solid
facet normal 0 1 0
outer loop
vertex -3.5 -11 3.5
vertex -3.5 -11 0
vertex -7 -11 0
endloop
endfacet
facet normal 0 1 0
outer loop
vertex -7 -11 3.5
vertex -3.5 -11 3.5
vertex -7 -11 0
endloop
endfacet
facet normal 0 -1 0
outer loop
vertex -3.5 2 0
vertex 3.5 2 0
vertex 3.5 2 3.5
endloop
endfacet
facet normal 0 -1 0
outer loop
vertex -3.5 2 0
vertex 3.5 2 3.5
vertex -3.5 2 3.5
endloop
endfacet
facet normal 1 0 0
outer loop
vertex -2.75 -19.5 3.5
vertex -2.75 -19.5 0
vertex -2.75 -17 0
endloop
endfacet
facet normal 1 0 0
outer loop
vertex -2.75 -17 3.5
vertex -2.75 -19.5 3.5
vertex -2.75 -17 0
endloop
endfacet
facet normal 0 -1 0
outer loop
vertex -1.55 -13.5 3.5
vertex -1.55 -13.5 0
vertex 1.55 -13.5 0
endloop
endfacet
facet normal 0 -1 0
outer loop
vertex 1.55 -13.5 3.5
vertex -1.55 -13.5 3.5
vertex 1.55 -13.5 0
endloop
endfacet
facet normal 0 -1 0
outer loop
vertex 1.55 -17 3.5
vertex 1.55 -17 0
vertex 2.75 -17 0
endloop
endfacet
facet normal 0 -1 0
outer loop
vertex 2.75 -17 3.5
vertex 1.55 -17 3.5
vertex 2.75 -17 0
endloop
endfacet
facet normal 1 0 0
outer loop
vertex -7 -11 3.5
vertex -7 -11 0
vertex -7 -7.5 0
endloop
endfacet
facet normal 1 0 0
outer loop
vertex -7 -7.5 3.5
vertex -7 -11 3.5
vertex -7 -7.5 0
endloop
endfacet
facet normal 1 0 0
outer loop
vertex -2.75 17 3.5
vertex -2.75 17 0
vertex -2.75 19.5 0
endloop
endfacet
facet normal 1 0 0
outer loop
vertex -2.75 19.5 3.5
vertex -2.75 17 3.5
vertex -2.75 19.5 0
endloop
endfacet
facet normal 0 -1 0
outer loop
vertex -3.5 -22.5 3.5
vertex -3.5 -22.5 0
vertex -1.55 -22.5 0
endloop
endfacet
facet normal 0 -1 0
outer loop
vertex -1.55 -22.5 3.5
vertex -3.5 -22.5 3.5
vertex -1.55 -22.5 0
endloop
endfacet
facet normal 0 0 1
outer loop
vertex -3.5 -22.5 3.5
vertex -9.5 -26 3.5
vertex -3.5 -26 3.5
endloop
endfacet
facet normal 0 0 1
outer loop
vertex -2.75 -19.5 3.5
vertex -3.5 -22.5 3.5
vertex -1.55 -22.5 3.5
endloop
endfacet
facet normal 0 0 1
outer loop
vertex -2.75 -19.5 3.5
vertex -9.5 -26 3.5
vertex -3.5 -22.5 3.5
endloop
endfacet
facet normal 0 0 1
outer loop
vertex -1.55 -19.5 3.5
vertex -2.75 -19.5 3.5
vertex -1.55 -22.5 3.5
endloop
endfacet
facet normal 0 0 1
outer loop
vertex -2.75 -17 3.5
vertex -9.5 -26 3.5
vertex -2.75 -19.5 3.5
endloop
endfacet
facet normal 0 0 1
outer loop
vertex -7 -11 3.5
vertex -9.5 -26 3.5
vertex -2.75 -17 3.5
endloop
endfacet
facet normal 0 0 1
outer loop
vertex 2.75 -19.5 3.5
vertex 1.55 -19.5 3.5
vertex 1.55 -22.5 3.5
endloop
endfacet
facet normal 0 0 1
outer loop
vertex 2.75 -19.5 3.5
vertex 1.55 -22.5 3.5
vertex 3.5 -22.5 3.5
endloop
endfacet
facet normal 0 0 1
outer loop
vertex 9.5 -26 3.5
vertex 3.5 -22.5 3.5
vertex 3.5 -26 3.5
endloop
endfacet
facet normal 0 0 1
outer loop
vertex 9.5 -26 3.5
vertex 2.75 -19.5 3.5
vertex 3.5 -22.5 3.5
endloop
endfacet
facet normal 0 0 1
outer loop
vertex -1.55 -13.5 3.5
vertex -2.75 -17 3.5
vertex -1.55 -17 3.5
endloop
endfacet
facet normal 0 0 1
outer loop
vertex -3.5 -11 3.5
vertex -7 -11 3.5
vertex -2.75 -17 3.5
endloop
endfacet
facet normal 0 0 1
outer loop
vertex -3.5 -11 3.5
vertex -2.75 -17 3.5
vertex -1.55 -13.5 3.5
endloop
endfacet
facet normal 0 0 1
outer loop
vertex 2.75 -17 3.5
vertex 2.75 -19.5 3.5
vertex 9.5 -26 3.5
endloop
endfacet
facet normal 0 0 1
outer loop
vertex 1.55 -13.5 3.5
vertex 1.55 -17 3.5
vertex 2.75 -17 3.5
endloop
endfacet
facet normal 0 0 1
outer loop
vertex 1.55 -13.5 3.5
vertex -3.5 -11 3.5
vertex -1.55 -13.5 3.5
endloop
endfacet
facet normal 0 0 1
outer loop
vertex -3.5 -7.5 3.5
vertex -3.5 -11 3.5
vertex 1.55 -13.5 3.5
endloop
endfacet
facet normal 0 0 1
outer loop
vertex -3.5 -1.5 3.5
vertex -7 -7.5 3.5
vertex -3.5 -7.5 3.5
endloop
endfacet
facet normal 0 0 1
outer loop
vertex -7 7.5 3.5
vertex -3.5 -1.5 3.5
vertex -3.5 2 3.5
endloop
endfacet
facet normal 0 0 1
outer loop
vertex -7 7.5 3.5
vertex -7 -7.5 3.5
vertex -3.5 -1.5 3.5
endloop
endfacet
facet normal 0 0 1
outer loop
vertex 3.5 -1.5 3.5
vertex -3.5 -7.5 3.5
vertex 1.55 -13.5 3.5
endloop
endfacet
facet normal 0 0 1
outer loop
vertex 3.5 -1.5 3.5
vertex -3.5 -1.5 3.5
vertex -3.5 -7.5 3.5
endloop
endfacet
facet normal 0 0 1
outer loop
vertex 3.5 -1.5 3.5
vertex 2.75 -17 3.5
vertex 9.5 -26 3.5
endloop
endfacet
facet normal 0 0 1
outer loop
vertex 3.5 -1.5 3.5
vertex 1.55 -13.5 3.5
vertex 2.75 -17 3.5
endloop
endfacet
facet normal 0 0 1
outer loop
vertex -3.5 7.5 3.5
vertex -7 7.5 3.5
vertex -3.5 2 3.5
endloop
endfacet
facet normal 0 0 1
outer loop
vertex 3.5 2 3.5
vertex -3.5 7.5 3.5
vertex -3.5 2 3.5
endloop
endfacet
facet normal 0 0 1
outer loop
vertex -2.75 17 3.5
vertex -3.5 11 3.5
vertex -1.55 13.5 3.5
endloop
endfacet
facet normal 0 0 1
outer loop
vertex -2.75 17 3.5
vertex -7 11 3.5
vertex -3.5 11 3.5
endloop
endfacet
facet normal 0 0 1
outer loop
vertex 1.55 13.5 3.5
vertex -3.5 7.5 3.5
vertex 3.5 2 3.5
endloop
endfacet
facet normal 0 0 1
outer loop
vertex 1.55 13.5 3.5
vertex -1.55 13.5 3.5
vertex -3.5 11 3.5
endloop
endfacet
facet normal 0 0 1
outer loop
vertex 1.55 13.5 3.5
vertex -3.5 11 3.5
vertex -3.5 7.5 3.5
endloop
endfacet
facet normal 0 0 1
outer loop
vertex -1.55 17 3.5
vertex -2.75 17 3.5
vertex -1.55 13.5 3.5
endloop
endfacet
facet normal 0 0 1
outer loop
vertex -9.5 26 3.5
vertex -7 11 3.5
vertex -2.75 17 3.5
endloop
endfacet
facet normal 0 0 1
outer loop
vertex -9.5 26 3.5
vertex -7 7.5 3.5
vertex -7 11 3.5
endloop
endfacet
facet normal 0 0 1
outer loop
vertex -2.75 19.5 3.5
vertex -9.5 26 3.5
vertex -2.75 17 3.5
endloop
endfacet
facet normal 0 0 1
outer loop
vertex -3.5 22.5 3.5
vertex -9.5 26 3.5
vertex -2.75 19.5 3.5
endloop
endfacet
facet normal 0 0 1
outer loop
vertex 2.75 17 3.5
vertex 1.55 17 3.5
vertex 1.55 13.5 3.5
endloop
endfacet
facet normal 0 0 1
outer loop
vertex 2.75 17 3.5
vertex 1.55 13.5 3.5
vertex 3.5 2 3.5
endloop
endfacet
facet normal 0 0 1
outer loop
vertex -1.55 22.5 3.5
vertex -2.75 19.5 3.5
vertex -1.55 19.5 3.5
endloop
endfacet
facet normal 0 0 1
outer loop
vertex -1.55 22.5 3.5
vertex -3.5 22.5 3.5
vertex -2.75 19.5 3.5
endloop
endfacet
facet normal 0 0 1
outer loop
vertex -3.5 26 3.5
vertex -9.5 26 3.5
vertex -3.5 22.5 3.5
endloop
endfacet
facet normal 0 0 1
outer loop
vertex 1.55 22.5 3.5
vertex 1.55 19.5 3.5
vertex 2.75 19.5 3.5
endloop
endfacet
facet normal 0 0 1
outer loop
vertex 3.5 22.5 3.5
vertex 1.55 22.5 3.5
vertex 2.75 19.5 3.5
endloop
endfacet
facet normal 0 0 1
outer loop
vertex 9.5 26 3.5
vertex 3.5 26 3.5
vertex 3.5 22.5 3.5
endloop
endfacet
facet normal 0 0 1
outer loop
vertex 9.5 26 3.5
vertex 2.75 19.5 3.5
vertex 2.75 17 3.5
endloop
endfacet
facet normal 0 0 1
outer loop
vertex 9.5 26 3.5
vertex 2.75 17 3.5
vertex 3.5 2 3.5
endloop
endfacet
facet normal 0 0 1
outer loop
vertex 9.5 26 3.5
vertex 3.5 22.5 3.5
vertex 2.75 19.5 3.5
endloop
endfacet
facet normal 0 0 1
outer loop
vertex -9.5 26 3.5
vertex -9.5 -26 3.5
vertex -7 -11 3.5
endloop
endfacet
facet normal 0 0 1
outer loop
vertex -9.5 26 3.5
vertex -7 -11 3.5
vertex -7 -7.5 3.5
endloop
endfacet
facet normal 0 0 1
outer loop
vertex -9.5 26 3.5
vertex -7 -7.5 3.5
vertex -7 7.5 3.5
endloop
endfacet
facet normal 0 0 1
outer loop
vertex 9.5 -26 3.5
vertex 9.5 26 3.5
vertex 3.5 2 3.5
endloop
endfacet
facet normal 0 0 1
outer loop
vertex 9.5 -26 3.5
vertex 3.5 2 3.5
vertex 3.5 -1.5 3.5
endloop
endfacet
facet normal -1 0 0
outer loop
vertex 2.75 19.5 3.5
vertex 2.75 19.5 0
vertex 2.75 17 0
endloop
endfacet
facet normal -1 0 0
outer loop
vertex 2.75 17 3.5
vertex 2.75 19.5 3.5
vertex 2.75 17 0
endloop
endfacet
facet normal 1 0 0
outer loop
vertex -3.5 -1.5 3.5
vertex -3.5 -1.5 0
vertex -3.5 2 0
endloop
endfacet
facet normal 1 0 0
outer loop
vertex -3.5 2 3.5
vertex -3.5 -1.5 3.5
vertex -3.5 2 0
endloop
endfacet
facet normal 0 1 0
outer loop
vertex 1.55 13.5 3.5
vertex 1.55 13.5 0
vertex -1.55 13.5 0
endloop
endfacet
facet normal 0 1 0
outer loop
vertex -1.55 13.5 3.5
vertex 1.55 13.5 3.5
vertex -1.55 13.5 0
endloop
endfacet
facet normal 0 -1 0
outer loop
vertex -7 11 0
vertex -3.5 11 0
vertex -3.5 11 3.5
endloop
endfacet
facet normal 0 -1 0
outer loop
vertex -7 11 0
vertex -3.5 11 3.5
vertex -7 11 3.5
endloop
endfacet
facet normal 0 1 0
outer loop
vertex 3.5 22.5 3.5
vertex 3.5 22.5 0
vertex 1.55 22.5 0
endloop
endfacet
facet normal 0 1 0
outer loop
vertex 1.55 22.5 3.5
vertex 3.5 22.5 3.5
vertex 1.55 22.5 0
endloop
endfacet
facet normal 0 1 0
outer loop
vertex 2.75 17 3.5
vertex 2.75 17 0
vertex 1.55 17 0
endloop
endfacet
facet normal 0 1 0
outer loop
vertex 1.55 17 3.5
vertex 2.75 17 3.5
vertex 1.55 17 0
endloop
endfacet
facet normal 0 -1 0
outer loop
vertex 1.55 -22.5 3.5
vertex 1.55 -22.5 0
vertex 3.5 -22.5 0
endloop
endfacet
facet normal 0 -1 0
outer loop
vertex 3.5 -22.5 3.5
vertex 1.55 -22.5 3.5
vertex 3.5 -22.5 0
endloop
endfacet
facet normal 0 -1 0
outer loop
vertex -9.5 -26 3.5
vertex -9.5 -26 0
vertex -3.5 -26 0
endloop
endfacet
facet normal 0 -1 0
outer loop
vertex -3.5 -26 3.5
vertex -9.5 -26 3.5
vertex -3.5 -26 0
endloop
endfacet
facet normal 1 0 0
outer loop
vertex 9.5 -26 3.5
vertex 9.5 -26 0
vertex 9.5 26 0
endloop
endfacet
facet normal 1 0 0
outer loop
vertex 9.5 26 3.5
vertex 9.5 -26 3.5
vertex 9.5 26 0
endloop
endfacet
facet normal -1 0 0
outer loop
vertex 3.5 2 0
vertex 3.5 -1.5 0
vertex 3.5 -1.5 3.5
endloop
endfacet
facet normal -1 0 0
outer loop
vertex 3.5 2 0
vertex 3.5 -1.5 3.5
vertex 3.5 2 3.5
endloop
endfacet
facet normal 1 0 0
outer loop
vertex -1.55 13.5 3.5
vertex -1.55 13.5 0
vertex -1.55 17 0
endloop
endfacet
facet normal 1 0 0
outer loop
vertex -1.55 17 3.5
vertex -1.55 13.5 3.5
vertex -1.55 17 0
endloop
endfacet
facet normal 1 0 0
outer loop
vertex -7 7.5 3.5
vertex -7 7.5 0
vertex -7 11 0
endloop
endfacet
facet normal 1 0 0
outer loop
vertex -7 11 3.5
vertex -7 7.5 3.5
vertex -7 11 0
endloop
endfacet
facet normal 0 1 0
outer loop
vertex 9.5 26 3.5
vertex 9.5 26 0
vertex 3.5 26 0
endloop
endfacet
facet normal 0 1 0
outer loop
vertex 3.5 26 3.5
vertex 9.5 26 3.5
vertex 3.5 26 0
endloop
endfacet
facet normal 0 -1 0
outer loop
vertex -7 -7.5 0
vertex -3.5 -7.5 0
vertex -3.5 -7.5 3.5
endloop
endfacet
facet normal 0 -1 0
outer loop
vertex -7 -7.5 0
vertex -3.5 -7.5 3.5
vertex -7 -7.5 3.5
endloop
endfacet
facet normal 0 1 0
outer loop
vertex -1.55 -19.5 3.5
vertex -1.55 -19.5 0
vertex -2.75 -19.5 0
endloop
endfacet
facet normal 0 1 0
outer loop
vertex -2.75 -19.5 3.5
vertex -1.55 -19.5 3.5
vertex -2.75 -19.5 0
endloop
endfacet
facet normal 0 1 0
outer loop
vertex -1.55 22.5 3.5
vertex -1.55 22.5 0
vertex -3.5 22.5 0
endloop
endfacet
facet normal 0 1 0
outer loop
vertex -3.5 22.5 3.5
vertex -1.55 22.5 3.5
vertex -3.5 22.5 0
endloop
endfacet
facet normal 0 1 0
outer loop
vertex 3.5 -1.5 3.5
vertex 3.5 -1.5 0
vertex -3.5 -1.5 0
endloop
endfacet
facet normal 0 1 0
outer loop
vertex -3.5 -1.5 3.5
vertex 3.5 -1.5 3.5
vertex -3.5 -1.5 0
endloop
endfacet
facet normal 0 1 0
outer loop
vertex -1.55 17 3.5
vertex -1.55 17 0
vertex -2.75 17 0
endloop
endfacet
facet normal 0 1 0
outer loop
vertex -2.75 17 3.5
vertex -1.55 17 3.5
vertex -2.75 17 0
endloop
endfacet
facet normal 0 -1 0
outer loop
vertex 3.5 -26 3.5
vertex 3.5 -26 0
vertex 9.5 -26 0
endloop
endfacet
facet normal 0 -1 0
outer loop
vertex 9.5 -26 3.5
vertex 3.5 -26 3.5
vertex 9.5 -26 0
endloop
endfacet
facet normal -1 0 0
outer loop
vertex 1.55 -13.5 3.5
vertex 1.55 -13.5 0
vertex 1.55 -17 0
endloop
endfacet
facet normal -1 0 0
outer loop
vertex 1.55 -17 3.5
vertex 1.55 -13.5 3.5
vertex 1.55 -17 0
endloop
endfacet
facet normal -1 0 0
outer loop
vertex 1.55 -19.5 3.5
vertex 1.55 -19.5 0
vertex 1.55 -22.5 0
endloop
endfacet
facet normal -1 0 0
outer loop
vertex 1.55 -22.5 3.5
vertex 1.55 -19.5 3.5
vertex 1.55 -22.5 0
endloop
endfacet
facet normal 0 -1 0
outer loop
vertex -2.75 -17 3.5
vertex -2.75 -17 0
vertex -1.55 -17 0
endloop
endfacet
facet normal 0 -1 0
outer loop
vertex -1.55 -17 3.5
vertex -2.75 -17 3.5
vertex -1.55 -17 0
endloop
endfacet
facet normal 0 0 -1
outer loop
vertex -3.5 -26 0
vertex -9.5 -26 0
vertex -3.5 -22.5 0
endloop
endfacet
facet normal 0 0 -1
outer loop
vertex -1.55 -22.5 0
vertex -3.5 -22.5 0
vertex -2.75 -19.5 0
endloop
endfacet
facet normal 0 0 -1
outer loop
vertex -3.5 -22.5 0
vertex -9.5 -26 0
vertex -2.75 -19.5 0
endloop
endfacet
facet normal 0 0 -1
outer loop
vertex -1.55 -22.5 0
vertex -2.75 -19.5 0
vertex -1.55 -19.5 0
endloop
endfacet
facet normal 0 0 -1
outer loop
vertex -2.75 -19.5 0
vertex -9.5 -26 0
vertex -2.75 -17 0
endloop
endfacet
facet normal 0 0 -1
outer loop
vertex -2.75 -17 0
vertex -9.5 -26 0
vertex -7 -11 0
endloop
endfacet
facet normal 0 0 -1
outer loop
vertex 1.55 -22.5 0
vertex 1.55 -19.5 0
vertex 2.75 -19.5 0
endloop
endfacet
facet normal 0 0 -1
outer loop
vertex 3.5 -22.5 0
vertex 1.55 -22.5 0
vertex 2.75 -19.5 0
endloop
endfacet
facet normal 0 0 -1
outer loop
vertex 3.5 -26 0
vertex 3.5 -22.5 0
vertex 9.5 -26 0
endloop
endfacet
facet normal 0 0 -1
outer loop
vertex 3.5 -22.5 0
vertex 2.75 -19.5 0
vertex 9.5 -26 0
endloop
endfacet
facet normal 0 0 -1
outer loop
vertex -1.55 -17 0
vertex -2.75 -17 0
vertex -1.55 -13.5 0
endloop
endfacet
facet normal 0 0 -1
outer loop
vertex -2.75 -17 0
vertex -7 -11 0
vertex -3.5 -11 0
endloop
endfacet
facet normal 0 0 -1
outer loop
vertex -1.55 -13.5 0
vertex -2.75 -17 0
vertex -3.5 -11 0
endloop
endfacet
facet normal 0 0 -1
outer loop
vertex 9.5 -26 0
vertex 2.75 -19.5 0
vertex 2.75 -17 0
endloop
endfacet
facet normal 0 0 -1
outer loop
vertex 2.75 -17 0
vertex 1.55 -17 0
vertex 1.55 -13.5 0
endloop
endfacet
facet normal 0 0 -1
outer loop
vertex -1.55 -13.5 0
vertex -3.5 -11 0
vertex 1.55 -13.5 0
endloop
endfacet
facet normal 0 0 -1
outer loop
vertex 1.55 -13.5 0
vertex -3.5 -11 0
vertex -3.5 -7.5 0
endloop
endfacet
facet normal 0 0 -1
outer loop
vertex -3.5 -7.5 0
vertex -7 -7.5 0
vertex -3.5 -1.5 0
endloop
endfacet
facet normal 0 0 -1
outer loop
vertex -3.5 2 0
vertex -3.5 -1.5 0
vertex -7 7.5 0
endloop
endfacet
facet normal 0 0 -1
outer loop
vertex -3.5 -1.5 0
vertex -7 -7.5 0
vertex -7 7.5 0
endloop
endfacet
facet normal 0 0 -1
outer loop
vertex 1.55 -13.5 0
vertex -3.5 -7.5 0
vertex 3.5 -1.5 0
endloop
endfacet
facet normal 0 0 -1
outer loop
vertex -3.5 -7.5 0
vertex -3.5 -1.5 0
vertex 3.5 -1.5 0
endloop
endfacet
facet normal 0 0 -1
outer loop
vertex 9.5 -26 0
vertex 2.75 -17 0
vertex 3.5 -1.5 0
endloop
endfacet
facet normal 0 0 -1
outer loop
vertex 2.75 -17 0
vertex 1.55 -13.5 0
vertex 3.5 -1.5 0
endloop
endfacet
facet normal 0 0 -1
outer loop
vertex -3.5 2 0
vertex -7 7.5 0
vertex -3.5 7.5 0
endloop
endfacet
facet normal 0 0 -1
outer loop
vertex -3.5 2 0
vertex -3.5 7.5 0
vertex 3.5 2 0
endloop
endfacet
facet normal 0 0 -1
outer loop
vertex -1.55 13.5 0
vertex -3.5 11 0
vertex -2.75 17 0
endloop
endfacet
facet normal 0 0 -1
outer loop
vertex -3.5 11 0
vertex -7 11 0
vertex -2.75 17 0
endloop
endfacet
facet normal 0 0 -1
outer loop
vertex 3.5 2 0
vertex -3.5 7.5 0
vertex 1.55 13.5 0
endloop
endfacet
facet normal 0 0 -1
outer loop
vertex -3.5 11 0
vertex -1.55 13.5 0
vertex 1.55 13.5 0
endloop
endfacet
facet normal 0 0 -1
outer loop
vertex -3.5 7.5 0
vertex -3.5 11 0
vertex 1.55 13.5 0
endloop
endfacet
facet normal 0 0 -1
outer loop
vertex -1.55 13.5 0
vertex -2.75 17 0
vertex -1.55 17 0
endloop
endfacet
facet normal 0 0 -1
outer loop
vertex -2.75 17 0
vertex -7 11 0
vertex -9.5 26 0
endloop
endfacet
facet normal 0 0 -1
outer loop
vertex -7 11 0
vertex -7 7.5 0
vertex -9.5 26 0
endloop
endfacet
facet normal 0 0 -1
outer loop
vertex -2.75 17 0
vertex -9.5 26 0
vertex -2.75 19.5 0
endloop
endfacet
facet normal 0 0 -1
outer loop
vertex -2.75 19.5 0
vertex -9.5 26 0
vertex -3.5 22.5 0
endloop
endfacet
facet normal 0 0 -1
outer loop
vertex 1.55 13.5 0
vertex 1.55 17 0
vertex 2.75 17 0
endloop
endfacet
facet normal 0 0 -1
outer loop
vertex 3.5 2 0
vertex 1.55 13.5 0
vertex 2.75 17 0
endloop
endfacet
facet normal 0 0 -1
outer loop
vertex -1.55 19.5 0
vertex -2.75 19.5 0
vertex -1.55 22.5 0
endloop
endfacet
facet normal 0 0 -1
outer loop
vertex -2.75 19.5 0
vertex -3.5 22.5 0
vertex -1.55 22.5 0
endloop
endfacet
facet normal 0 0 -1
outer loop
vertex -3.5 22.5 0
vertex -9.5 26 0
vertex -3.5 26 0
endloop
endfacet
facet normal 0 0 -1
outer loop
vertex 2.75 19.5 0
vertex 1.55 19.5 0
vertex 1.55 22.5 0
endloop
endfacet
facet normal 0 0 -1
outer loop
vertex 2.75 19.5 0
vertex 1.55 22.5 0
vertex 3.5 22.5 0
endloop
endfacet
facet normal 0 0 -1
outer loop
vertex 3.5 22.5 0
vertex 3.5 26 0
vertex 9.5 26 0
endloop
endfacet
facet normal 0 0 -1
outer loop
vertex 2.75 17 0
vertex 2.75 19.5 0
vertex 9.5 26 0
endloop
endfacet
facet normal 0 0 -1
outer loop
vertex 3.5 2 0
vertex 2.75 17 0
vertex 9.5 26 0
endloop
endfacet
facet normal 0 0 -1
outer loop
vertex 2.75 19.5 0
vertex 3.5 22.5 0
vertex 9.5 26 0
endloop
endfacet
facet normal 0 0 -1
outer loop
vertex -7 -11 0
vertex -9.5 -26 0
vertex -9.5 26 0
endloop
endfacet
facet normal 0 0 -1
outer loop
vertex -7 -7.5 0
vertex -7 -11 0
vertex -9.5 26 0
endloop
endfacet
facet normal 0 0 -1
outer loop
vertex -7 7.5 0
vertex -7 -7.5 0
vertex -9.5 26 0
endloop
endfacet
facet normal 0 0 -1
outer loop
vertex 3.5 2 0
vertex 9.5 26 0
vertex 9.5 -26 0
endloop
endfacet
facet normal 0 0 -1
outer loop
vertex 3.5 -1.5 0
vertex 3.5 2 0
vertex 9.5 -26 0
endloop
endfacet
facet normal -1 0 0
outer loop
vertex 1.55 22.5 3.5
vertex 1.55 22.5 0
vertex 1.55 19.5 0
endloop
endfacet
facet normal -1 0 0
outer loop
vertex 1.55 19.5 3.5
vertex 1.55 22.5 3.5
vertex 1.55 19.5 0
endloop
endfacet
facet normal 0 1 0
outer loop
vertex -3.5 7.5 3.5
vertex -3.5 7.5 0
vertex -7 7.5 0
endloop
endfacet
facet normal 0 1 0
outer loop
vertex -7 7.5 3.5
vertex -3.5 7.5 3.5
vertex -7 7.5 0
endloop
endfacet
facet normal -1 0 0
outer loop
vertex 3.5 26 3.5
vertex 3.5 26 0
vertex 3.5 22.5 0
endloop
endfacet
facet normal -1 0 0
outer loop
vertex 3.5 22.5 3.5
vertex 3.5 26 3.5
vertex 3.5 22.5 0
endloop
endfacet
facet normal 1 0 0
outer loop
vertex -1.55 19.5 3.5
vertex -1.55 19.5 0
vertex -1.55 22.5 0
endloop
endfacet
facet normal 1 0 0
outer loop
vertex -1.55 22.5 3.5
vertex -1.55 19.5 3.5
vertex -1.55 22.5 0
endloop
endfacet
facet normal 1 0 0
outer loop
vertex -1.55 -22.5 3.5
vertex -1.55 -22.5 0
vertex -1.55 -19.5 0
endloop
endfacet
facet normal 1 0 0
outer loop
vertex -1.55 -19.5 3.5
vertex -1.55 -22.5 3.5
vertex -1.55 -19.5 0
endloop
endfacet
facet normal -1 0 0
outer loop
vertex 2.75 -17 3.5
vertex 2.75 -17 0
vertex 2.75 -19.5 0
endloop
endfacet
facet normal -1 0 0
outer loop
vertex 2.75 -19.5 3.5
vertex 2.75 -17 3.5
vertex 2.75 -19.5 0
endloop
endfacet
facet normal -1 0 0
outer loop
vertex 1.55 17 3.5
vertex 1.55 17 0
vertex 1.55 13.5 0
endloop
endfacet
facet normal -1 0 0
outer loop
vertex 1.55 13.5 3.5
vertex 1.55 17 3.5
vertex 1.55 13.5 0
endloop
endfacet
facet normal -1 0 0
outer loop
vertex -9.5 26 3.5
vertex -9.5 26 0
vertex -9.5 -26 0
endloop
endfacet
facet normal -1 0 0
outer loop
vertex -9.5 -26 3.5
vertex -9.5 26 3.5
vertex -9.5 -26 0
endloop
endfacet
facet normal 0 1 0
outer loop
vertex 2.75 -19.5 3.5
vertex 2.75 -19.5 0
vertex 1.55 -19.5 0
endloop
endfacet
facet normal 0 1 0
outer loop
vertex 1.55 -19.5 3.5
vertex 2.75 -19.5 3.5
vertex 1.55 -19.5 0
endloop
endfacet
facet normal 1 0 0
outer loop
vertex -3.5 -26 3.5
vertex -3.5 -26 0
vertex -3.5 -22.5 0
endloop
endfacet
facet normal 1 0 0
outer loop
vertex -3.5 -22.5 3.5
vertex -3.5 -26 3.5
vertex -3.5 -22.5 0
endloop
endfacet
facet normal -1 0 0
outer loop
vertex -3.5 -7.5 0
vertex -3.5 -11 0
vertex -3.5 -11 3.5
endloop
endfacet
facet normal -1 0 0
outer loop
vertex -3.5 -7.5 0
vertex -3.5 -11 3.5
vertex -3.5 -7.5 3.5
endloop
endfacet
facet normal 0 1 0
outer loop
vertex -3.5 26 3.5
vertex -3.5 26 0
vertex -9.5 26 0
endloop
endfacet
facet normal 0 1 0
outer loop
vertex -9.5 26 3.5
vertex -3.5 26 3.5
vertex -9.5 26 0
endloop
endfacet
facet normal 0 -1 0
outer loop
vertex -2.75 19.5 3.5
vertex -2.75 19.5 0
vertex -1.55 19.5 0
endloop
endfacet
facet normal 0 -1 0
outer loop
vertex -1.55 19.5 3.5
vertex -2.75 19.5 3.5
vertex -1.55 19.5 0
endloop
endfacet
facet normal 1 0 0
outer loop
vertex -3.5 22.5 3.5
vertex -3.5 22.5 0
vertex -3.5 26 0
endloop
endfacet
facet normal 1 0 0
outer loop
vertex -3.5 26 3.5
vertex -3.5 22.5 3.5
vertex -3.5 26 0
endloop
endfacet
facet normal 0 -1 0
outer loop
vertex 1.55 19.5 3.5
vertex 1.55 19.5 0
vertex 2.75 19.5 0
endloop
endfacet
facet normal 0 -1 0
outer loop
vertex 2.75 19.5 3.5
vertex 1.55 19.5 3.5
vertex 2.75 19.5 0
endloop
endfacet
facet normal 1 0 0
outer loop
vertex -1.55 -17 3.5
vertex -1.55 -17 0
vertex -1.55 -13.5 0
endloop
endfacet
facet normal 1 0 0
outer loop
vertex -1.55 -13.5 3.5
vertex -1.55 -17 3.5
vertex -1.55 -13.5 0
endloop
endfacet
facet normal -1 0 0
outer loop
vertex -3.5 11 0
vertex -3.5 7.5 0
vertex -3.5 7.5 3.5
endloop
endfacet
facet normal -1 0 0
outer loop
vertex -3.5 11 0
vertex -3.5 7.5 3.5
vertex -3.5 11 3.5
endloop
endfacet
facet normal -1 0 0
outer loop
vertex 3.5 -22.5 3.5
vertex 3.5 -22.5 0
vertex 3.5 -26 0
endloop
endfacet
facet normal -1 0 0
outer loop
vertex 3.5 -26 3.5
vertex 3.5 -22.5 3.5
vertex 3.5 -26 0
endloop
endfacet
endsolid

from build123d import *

# Parameters (mm, degrees)
BOSS_EXTRUDE1_DEPTH = 3.5
SKETCH2_W           = 3.5
SKETCH2_H           = 3.5
CUT_EXTRUDE1_DEPTH  = 28.901612857
SKETCH3_W           = 7
SKETCH3_H           = 3.5
CUT_EXTRUDE2_DEPTH  = 28.901612857


with BuildPart() as part:
    # Sketch1 → Boss-Extrude1 (new body)
    with BuildSketch(Plane.XY):
        Polygon((3.5, 26), (3.5, 22.5), (1.55, 22.5), (1.55, 19.5), (2.75, 19.5), (2.75, 17), (1.55, 17), (1.55, 13.5), (-1.55, 13.5), (-1.55, 17), (-2.75, 17), (-2.75, 19.5), (-1.55, 19.5), (-1.55, 22.5), (-3.5, 22.5), (-3.5, 26), (-9.5, 26), (-9.5, -26), (-3.5, -26), (-3.5, -22.5), (-1.55, -22.5), (-1.55, -19.5), (-2.75, -19.5), (-2.75, -17), (-1.55, -17), (-1.55, -13.5), (1.55, -13.5), (1.55, -17), (2.75, -17), (2.75, -19.5), (1.55, -19.5), (1.55, -22.5), (3.5, -22.5), (3.5, -26), (9.5, -26), (9.5, 26), align=None)
    extrude(amount=BOSS_EXTRUDE1_DEPTH)

    # Sketch2 → Cut-Extrude1 (cut, through all)
    with BuildSketch(Plane(origin=(0, 0, 0), x_dir=(-1, 0, 0), z_dir=(0, 0, -1))):
        with Locations((5.25, -9.25)):
            Rectangle(SKETCH2_W, SKETCH2_H)
        with Locations((5.25, 9.25)):
            Rectangle(SKETCH2_W, SKETCH2_H)
    extrude(amount=-CUT_EXTRUDE1_DEPTH, mode=Mode.SUBTRACT)

    # Sketch3 → Cut-Extrude2 (cut, through all)
    with BuildSketch(Plane(origin=(0, 0, 0), x_dir=(-1, 0, 0), z_dir=(0, 0, -1))):
        with Locations((0, 0.25)):
            Rectangle(SKETCH3_W, SKETCH3_H)
    extrude(amount=-CUT_EXTRUDE2_DEPTH, mode=Mode.SUBTRACT)


solid = part.part
